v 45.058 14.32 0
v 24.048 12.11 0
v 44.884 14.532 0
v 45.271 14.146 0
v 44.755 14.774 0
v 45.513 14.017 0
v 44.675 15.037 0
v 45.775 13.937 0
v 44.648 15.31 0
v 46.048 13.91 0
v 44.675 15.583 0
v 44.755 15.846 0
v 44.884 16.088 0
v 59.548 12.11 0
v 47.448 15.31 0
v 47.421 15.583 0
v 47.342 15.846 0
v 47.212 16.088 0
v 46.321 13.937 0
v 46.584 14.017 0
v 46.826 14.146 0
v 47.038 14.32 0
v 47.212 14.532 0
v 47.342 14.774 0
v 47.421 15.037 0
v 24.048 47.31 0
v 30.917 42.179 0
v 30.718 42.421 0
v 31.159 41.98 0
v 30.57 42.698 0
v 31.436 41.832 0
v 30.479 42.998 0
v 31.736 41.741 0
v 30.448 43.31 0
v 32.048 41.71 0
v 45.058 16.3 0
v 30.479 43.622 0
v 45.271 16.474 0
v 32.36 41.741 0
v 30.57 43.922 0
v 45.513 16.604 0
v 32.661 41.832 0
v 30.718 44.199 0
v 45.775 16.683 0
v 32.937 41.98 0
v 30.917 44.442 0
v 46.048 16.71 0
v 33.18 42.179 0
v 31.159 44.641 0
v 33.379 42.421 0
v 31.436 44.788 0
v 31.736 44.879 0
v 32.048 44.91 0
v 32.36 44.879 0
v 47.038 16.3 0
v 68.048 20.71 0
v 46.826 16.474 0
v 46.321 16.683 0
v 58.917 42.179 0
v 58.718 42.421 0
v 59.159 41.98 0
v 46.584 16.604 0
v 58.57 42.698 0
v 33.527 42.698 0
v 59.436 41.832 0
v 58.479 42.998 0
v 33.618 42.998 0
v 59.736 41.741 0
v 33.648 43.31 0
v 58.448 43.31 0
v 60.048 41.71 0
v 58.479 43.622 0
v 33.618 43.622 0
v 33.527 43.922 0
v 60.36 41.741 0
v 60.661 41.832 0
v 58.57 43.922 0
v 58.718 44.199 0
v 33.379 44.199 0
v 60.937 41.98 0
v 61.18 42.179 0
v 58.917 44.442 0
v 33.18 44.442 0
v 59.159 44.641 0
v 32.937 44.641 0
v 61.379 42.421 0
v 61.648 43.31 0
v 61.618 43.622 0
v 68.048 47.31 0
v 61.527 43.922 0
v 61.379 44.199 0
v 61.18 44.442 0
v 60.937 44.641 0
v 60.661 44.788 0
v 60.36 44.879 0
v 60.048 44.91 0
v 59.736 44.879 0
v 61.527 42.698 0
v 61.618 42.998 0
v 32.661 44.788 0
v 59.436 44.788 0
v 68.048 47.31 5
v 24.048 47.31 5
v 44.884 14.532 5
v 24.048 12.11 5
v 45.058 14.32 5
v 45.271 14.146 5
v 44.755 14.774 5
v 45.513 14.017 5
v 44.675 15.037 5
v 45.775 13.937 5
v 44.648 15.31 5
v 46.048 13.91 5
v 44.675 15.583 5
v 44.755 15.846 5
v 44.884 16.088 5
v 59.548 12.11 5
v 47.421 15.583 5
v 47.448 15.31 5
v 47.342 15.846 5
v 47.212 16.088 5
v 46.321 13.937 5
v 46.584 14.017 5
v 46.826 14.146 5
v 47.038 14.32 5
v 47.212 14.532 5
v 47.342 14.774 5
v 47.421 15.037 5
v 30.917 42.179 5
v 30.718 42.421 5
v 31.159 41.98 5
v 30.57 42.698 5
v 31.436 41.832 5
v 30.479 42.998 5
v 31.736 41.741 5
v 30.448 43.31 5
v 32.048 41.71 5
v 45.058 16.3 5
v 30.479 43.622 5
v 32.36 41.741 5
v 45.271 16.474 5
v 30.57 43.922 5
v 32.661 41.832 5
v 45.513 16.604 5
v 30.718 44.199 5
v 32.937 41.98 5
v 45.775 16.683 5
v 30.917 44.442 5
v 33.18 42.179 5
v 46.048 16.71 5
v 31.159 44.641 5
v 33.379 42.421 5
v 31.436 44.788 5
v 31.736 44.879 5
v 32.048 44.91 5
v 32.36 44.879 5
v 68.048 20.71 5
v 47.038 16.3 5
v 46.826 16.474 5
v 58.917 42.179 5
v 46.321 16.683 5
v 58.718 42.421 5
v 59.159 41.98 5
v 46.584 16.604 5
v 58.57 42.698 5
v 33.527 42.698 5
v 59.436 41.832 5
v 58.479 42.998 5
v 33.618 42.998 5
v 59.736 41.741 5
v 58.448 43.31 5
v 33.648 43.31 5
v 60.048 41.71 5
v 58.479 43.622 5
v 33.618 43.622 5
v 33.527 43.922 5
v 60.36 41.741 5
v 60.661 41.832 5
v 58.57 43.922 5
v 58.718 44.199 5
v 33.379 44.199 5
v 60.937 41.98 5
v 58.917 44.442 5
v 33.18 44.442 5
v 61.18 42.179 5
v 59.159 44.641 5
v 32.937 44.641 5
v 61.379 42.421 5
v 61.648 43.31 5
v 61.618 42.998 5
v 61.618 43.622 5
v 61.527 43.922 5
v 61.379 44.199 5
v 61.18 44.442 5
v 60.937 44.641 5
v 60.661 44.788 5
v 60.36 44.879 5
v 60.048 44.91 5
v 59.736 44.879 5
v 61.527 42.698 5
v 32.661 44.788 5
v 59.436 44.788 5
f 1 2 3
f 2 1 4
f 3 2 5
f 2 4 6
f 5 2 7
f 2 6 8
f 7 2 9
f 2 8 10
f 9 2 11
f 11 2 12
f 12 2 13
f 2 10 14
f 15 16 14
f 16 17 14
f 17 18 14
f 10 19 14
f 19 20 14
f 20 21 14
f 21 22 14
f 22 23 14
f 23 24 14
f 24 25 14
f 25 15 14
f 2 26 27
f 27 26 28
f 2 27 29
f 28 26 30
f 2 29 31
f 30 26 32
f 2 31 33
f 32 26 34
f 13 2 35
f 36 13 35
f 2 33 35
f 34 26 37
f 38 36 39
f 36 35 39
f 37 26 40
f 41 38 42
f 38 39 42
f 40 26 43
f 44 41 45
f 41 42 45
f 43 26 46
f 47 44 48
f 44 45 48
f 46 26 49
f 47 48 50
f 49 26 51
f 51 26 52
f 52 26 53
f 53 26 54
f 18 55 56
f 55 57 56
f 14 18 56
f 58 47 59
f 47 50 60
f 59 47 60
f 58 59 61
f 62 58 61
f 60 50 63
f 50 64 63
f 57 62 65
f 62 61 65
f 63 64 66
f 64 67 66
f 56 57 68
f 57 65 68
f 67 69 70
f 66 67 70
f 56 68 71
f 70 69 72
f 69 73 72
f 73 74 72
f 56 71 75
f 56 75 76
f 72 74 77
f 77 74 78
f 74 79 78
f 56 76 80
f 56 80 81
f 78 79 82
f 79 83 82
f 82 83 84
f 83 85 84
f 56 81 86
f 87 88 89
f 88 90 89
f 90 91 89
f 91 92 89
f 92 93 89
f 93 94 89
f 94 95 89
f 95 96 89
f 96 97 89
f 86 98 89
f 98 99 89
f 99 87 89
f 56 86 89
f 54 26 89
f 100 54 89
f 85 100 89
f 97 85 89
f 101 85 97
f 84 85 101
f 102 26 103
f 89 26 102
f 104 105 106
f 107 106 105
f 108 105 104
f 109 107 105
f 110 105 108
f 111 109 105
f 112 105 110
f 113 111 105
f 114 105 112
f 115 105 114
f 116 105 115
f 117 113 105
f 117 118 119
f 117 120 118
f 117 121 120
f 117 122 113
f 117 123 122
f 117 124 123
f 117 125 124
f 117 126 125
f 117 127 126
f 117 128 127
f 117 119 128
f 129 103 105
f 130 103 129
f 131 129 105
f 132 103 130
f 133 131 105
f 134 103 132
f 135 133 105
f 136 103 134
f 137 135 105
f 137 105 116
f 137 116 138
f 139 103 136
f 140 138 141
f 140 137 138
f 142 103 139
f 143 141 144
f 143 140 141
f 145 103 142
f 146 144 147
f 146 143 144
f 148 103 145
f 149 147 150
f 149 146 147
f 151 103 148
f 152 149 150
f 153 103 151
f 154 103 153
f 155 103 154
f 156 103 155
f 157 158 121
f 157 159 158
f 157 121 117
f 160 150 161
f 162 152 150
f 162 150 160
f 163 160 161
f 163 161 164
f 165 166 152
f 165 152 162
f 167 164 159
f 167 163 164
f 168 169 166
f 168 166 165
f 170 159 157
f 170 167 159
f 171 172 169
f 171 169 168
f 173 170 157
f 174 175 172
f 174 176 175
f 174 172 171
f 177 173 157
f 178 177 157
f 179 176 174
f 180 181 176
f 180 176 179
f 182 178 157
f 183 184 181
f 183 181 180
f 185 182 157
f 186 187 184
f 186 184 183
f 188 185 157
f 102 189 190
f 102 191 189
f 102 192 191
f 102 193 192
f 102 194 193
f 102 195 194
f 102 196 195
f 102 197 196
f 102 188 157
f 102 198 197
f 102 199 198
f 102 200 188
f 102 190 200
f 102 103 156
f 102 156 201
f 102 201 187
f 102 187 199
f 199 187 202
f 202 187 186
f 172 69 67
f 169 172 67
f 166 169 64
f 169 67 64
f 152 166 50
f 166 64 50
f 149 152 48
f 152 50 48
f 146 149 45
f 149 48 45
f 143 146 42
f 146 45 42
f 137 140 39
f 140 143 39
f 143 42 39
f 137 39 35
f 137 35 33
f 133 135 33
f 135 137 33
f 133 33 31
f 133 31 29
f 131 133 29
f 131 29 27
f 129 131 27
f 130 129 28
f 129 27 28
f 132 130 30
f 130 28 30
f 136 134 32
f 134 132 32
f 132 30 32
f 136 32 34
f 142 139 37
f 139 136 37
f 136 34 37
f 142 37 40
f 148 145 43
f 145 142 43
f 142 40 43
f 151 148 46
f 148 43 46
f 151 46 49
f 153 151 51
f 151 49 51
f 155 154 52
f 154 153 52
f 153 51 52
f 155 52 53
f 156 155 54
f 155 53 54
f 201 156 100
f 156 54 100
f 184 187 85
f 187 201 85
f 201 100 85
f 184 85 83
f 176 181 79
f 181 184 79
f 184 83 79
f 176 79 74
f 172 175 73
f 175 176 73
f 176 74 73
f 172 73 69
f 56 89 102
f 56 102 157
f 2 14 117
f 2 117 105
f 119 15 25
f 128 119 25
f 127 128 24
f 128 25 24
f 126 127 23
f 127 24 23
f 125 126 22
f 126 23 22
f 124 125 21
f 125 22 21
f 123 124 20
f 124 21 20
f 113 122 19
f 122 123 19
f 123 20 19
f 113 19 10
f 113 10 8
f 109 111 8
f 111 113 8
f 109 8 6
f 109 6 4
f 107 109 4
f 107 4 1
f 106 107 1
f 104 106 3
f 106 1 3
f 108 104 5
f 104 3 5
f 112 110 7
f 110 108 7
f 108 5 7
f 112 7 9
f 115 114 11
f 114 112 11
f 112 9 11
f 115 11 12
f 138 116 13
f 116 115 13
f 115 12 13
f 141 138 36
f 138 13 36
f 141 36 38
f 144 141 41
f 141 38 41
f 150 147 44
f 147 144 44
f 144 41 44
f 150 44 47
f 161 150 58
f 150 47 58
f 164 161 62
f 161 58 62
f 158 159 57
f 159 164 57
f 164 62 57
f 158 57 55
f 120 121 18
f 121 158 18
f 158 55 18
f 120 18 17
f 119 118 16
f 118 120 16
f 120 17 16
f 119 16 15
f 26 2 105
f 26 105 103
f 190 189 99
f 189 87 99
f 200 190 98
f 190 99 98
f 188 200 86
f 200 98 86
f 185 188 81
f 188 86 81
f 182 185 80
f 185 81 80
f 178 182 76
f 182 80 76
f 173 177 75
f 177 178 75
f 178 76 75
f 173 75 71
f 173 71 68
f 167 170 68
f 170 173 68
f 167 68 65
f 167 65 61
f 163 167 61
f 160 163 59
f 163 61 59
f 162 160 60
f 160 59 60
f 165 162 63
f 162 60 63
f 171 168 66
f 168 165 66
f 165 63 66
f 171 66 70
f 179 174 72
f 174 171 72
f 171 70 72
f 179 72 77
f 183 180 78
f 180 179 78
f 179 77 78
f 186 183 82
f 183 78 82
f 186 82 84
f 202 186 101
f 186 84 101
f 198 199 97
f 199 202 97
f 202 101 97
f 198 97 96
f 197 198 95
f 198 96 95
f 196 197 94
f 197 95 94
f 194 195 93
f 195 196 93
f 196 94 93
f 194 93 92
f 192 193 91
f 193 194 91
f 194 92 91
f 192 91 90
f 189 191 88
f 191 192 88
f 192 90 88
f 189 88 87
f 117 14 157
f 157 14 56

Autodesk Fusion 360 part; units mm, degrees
sketch "Schizzo1" plane through (0, 0, 0) normal (0, 0, 1) x (1, 0, 0)
  line L0 (24.0483, 47.3102) -> (68.0483, 47.3102)
  line L1 (68.0483, 47.3102) -> (68.0483, 12.1102)
  line L2 (68.0483, 12.1102) -> (24.0483, 12.1102)
  line L3 (24.0483, 12.1102) -> (24.0483, 47.3102)
  line L4 (46.0483, 47.3102) -> (46.0483, 12.1102) construction
  line L5 (24.0483, 43.3102) -> (68.0483, 43.3102) construction
  circle A0 centre (46.0483, 15.3102) radius 1.4
  circle A1 centre (32.0483, 43.3102) radius 1.6
  circle A2 centre (60.0483, 43.3102) radius 1.6
  line L6 (59.5483, 12.1102) -> (68.0483, 20.7102)
  dimension "d1" = 44
  dimension "d2" = 35.2
  dimension "d3" = 2.8
  dimension "d4" = 4
  dimension "d6" = 28
  dimension "d7" = 3.2
  dimension "d8" = 28
  dimension "d9" = 8.5
  dimension "d10" = 8.6
extrude "Estrusione1" add sketch "Schizzo1" along normal blind 5 contours L0 L1 L2 L3 L6
